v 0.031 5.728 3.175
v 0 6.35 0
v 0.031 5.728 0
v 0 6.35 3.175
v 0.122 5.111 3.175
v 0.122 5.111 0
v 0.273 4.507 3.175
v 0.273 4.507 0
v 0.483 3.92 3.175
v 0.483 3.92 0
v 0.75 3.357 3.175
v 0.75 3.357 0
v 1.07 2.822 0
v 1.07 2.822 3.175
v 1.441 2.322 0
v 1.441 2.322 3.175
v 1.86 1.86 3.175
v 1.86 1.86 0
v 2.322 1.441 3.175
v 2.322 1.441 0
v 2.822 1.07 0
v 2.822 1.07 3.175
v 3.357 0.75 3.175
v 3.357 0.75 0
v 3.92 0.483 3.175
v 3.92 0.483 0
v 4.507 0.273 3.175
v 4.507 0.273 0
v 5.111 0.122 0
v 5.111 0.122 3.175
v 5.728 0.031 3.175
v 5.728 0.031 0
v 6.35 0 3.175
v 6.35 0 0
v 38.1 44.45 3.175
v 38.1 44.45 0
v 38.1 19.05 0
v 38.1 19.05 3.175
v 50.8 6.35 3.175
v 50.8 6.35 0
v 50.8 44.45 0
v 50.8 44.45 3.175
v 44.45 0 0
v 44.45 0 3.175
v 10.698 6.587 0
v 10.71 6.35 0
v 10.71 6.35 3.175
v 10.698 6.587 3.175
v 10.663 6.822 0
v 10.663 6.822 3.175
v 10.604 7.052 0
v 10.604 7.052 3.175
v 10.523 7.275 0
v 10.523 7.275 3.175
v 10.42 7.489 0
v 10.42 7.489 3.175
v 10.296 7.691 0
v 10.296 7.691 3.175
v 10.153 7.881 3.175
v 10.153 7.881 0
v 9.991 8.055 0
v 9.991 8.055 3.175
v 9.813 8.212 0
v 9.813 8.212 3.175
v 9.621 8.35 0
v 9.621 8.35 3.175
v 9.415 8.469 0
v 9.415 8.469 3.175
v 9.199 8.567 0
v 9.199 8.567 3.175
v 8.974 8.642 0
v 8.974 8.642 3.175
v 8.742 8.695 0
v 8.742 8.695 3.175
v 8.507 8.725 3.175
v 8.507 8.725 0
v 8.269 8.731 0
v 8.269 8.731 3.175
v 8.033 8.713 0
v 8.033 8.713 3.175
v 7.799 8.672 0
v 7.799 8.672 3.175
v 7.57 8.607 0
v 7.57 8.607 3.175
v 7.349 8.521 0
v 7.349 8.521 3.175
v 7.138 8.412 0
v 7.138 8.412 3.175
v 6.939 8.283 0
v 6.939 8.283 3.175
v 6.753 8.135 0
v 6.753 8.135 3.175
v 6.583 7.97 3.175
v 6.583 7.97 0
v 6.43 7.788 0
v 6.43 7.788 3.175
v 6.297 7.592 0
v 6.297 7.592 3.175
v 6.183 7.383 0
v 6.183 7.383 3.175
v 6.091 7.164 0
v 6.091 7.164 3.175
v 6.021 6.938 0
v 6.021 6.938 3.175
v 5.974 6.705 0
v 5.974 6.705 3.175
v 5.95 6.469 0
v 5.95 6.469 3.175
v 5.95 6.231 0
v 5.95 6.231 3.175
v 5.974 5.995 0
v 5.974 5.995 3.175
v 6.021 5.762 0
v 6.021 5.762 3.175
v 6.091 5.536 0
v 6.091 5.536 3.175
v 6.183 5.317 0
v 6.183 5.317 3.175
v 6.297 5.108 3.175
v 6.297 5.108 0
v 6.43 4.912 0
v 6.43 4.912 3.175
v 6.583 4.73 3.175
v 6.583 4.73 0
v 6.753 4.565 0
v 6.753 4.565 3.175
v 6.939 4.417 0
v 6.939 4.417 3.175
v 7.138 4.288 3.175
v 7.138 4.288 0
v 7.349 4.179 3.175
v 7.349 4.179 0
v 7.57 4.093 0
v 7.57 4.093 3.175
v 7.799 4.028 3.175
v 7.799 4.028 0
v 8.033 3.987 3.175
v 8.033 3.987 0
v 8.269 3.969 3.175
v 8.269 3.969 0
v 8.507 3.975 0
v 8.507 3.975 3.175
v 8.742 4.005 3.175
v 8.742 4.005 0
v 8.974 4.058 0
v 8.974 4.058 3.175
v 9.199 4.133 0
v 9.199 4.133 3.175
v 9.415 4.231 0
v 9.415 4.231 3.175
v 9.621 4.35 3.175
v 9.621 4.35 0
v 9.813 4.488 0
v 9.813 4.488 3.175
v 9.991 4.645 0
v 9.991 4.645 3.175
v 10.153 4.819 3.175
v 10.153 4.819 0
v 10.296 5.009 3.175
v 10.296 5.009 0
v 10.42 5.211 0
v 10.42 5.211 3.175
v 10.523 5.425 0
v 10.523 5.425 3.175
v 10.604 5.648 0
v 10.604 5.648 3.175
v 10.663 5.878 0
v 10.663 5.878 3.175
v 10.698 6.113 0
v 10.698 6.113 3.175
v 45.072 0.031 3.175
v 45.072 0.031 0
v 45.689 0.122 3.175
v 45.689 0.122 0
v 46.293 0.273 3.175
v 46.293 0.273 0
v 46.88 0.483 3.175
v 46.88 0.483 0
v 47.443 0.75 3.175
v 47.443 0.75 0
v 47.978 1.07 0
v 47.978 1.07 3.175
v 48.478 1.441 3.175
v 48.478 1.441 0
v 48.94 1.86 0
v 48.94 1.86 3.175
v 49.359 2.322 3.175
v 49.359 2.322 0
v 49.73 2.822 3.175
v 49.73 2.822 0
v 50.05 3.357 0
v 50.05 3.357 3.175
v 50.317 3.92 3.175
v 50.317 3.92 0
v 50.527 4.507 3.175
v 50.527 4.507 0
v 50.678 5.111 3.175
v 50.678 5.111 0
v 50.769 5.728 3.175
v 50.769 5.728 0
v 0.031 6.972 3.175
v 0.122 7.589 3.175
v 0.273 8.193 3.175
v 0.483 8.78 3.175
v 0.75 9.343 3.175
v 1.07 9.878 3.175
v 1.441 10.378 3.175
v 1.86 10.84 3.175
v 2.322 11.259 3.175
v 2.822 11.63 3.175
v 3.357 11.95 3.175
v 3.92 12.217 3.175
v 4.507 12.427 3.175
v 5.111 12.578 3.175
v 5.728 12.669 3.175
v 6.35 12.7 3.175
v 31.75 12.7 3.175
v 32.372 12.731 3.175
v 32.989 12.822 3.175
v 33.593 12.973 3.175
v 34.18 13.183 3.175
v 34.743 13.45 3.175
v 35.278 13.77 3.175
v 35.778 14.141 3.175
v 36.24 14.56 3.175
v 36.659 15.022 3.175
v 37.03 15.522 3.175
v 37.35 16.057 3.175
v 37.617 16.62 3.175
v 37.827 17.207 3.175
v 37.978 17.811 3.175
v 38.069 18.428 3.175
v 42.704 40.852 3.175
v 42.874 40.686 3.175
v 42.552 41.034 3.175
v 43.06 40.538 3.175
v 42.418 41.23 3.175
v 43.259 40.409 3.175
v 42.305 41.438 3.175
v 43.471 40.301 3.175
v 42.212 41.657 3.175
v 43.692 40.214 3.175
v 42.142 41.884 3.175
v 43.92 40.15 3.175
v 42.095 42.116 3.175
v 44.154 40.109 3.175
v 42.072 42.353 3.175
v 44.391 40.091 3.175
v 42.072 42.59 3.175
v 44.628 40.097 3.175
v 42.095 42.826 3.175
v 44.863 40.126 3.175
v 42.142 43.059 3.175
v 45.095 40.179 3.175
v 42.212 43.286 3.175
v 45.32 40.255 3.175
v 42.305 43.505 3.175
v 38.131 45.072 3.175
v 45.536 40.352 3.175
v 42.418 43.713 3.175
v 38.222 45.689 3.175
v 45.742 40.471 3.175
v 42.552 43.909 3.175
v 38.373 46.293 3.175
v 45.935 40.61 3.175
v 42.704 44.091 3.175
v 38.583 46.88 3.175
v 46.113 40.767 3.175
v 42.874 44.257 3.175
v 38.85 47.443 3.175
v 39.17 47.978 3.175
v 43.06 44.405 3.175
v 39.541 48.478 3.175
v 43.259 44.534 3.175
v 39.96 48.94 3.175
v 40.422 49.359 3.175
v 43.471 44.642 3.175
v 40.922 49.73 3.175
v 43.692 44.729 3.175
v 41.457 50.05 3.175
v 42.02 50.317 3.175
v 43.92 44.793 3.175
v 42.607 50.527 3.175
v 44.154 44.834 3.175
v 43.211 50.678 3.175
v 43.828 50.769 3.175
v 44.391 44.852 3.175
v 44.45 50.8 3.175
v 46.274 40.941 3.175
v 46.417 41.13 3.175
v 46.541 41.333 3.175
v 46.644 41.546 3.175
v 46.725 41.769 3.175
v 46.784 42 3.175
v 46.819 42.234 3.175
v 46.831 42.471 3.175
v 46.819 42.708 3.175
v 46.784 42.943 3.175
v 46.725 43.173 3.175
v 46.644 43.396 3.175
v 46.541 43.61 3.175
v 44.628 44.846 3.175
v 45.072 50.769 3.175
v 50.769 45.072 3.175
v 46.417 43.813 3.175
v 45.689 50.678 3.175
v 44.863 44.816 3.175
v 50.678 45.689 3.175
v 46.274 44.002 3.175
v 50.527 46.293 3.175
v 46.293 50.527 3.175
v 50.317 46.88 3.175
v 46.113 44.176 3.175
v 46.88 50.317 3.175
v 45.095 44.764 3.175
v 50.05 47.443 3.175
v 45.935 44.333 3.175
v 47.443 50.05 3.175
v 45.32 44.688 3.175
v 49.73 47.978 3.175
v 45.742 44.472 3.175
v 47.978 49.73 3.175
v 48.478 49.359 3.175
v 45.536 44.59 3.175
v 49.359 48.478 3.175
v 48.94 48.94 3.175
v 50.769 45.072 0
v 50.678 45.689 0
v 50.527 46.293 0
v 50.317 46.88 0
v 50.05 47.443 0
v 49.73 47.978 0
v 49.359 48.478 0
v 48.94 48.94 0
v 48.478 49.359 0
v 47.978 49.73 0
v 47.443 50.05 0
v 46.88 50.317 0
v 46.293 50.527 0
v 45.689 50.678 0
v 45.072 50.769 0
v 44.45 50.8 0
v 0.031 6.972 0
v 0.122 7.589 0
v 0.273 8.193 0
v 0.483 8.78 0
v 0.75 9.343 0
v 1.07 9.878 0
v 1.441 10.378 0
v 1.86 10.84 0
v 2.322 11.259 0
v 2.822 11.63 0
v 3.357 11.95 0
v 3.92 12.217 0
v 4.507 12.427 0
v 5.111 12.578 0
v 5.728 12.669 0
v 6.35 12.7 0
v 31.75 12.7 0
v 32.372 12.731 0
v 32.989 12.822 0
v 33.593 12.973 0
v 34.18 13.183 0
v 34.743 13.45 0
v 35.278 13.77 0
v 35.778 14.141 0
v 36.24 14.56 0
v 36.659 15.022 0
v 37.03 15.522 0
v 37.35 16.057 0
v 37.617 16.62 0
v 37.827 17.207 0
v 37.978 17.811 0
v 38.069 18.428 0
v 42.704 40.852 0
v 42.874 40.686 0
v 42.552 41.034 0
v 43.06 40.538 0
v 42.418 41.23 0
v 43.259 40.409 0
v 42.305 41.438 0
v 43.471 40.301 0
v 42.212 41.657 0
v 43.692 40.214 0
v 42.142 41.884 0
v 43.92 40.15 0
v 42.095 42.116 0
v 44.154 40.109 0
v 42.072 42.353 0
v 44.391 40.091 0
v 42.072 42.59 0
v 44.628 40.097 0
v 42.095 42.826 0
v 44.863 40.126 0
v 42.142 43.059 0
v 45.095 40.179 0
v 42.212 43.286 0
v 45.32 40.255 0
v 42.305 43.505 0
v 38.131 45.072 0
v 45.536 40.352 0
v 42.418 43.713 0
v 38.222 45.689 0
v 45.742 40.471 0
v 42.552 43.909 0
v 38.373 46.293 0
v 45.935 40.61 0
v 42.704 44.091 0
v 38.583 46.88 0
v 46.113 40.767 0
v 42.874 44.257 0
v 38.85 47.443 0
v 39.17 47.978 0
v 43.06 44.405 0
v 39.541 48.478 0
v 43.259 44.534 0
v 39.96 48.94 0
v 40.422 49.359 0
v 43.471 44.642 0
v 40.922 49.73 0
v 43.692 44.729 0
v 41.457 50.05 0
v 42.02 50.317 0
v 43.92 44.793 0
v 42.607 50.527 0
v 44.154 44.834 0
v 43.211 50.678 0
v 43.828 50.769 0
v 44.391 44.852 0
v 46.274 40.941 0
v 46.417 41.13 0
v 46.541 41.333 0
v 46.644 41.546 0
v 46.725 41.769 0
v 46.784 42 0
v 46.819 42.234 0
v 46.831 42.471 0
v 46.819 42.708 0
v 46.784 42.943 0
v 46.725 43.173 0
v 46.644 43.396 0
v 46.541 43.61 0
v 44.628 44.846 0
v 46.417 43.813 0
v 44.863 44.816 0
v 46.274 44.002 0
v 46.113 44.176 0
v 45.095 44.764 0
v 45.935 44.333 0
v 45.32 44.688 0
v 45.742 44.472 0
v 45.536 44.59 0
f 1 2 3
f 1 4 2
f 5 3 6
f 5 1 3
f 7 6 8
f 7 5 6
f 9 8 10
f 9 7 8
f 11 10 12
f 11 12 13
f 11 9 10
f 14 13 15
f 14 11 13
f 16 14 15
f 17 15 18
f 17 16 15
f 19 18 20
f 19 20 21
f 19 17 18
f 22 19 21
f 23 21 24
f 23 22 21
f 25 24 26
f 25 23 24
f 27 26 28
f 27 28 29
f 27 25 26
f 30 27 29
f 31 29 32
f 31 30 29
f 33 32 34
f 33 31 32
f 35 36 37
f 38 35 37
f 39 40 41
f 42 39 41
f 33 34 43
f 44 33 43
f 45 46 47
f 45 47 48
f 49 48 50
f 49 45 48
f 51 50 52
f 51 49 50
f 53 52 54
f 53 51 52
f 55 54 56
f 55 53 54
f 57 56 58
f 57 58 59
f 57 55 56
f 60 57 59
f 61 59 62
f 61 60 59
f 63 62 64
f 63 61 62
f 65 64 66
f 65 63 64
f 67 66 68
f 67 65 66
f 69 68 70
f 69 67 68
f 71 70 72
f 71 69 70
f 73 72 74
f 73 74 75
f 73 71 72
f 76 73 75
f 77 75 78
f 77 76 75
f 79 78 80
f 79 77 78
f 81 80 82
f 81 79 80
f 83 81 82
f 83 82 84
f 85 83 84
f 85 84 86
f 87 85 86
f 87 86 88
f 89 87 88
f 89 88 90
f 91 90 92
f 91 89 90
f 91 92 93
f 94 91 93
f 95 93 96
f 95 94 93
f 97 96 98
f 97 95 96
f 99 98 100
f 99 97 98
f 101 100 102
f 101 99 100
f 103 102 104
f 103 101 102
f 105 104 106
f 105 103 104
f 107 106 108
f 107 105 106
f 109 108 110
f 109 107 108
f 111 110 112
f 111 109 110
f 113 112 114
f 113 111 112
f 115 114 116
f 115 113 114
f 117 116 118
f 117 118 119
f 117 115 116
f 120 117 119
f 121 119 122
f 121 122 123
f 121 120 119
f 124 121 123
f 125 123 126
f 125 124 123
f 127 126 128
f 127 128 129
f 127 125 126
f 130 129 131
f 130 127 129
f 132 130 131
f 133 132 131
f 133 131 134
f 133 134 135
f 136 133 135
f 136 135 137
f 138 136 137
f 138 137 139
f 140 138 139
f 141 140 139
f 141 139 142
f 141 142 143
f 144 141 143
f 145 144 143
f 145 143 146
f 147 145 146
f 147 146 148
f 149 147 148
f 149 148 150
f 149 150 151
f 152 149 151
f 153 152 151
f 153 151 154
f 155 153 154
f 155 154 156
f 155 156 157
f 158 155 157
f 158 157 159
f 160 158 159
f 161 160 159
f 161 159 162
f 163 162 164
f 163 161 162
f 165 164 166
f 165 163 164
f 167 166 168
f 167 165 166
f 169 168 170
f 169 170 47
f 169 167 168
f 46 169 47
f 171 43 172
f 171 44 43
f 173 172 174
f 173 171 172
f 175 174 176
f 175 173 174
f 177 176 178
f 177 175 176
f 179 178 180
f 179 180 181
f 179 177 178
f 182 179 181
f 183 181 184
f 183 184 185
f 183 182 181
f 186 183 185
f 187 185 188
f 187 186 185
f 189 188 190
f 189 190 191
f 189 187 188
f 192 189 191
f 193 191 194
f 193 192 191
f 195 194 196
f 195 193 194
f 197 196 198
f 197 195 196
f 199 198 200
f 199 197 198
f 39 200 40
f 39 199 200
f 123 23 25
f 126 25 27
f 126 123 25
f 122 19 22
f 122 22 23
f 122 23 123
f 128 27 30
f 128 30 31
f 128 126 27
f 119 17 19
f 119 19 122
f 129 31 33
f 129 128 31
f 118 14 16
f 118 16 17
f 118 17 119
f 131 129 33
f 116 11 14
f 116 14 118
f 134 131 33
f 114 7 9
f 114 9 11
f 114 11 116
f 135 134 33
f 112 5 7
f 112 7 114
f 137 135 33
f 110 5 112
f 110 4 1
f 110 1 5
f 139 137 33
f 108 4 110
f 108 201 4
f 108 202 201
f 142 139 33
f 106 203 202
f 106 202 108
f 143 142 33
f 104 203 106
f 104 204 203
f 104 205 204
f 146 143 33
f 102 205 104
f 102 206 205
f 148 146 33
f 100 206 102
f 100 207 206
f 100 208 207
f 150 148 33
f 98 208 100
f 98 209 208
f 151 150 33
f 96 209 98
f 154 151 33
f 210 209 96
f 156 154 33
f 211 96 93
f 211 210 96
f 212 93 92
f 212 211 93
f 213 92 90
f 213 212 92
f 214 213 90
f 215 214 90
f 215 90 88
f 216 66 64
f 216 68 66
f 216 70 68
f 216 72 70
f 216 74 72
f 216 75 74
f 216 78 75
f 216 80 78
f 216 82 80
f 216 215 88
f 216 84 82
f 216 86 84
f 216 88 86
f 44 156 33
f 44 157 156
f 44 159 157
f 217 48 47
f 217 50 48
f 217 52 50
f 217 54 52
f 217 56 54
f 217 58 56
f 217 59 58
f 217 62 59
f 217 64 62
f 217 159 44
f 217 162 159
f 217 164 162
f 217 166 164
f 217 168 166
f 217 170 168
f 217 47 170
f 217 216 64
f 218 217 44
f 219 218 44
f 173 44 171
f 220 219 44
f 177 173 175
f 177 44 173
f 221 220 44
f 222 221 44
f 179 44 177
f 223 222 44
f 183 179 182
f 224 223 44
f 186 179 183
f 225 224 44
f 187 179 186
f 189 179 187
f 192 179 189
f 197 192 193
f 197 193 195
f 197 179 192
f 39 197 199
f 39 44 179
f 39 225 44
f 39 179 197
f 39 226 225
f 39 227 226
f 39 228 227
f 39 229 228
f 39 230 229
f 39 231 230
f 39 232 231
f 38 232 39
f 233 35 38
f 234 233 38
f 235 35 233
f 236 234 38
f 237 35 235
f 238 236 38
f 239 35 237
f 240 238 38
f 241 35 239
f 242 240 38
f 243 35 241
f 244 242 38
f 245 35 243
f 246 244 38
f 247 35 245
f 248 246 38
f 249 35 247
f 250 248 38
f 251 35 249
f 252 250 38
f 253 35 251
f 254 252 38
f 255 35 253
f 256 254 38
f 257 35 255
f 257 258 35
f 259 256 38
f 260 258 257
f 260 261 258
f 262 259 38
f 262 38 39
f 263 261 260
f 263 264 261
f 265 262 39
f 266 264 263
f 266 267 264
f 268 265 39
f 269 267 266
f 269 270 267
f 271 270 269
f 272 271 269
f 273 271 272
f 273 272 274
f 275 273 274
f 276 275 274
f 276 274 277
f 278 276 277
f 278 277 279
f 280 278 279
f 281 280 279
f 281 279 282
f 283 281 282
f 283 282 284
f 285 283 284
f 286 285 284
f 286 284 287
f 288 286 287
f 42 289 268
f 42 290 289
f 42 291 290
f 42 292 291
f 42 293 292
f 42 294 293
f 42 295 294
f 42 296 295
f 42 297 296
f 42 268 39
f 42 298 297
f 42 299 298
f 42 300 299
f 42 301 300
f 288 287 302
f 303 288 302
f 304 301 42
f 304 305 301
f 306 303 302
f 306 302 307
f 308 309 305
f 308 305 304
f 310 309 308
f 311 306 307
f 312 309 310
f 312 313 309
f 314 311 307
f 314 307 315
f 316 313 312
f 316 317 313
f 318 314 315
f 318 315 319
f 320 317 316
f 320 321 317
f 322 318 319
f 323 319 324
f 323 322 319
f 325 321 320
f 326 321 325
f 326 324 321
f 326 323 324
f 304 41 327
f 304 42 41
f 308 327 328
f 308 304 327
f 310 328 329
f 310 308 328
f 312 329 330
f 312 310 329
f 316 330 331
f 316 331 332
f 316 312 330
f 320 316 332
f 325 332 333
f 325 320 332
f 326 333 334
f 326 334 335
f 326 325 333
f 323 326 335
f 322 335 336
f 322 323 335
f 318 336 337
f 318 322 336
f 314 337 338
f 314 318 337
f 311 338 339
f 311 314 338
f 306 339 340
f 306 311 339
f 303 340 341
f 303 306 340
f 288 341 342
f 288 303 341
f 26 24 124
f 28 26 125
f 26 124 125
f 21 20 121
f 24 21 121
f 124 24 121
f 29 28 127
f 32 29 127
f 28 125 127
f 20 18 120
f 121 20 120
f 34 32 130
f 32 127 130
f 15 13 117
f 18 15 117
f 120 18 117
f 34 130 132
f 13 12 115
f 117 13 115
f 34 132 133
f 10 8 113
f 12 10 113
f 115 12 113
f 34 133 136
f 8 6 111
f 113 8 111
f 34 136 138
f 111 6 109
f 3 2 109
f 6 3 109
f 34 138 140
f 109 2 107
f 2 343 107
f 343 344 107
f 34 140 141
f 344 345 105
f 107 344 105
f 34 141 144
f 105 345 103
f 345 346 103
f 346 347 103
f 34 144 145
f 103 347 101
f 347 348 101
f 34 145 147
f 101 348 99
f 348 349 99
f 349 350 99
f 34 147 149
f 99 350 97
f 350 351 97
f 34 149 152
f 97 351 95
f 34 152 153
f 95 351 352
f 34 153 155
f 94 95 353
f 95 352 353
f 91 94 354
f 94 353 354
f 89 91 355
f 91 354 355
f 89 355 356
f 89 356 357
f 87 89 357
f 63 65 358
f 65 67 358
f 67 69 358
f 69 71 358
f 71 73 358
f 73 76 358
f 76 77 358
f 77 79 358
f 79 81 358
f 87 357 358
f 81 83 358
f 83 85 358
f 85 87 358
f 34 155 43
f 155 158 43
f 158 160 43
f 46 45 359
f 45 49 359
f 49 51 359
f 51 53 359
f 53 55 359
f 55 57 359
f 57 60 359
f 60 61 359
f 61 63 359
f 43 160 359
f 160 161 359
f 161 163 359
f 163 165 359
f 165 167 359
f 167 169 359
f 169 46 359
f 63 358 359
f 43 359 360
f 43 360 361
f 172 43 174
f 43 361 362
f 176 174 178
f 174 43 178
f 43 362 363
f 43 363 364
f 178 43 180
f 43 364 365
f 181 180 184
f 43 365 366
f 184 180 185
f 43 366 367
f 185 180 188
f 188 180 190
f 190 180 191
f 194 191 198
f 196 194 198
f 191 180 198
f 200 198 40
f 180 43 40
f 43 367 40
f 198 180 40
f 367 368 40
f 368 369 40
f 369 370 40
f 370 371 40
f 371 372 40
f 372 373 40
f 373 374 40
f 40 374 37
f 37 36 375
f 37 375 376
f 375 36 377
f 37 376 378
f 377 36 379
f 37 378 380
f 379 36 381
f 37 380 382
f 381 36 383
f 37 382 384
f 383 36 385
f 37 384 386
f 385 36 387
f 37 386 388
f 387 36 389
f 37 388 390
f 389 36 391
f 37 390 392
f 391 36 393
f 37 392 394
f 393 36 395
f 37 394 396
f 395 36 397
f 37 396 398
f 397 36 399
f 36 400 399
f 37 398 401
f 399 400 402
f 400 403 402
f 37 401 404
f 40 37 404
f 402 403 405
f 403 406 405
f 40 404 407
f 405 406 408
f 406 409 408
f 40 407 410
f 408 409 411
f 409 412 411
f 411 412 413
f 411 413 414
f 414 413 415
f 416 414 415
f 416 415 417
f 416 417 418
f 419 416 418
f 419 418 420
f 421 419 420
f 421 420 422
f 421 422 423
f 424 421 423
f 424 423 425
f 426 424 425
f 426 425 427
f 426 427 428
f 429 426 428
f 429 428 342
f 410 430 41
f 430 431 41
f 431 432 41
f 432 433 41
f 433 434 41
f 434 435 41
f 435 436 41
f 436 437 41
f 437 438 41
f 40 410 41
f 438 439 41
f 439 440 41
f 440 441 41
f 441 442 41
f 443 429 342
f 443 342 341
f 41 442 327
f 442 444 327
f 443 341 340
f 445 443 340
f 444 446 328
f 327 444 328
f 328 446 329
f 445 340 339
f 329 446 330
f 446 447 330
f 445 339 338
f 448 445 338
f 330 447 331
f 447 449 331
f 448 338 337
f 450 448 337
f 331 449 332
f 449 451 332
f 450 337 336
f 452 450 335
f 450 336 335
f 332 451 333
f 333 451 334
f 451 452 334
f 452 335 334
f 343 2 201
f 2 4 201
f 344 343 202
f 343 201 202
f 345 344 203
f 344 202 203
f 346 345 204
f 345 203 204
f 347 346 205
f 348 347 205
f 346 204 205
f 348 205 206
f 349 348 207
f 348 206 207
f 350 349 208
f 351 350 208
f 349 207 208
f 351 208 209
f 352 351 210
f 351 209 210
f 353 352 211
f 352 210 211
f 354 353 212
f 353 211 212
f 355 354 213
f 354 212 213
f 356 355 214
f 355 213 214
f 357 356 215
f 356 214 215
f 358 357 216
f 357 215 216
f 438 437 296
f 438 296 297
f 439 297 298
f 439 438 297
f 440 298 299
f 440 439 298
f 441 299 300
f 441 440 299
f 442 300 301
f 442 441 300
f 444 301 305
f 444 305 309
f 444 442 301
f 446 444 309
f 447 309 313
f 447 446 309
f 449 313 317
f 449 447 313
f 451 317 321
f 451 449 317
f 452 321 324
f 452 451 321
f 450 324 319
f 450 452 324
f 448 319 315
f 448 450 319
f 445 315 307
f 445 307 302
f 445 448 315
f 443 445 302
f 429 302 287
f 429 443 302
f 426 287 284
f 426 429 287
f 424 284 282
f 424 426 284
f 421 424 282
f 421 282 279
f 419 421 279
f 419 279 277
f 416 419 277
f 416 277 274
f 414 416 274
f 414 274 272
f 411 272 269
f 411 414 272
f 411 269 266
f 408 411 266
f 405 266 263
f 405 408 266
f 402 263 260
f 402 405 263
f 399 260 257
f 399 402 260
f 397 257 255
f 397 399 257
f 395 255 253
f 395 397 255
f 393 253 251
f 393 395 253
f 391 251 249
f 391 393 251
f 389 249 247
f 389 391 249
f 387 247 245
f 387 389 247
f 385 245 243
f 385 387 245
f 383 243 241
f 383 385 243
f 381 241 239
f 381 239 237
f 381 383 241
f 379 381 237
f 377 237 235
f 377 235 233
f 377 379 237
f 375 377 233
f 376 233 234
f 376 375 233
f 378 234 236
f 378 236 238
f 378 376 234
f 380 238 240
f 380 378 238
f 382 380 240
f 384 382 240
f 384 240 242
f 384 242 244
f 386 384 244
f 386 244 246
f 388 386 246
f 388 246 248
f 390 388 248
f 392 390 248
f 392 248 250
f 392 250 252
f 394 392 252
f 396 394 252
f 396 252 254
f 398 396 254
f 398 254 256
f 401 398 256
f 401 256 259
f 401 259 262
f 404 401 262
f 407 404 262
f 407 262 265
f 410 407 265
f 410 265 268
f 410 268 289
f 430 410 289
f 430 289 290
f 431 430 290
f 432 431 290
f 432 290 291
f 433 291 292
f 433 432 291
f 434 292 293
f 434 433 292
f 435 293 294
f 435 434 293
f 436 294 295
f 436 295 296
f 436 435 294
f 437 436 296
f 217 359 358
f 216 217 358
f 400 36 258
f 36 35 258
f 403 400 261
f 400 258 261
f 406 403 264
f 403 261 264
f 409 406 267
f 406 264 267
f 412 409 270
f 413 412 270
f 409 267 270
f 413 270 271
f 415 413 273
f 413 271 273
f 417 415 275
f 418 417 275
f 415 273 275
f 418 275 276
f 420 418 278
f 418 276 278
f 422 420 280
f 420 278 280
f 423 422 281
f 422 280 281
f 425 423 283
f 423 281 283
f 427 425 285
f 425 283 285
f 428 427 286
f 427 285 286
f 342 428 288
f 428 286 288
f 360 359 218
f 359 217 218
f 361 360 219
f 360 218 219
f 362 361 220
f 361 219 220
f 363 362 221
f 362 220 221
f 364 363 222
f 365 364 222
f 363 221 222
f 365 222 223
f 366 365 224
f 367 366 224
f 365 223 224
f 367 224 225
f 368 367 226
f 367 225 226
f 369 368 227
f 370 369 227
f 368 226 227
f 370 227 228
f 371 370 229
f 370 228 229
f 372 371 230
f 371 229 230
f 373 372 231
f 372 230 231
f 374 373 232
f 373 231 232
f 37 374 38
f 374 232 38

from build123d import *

# Parameters (mm, degrees)
F0_R     = 2.38125
F1_DEPTH = 3.175
F2_R     = 6.34999


# Not quite as in the source:
# - a fillet or chamfer is up to 0.001 mm smaller than in the source, because OpenCascade refuses the exact size


with BuildPart() as f1:
    # F0 (on Top) → F1 (new body)
    with BuildSketch(Plane.XY):
        Polygon((0, 12.7), (0, 0), (50.8, 0), (50.8, 50.8), (38.1, 50.8), (38.1, 12.7), align=None)
        with Locations((8.3286329803, 6.35)):
            Circle(F0_R, mode=Mode.SUBTRACT)
        with Locations((44.45, 42.4713670197)):
            Circle(F0_R, mode=Mode.SUBTRACT)
    extrude(amount=F1_DEPTH)

    # F2 (radius 6.35 in the source; OpenCascade refuses exactly that, so slightly less here)
    f2_edges = [f1.edges().sort_by_distance(p)[0] for p in [
        (0, 0, 1.5875),
        (0, 12.7, 1.5875),
        (38.1, 50.8, 1.5875),
        (38.1, 12.7, 1.5875),
        (50.8, 0, 1.5875),
        (50.8, 50.8, 1.5875),
    ]]
    fillet(f2_edges, radius=F2_R)


solid = f1.part
